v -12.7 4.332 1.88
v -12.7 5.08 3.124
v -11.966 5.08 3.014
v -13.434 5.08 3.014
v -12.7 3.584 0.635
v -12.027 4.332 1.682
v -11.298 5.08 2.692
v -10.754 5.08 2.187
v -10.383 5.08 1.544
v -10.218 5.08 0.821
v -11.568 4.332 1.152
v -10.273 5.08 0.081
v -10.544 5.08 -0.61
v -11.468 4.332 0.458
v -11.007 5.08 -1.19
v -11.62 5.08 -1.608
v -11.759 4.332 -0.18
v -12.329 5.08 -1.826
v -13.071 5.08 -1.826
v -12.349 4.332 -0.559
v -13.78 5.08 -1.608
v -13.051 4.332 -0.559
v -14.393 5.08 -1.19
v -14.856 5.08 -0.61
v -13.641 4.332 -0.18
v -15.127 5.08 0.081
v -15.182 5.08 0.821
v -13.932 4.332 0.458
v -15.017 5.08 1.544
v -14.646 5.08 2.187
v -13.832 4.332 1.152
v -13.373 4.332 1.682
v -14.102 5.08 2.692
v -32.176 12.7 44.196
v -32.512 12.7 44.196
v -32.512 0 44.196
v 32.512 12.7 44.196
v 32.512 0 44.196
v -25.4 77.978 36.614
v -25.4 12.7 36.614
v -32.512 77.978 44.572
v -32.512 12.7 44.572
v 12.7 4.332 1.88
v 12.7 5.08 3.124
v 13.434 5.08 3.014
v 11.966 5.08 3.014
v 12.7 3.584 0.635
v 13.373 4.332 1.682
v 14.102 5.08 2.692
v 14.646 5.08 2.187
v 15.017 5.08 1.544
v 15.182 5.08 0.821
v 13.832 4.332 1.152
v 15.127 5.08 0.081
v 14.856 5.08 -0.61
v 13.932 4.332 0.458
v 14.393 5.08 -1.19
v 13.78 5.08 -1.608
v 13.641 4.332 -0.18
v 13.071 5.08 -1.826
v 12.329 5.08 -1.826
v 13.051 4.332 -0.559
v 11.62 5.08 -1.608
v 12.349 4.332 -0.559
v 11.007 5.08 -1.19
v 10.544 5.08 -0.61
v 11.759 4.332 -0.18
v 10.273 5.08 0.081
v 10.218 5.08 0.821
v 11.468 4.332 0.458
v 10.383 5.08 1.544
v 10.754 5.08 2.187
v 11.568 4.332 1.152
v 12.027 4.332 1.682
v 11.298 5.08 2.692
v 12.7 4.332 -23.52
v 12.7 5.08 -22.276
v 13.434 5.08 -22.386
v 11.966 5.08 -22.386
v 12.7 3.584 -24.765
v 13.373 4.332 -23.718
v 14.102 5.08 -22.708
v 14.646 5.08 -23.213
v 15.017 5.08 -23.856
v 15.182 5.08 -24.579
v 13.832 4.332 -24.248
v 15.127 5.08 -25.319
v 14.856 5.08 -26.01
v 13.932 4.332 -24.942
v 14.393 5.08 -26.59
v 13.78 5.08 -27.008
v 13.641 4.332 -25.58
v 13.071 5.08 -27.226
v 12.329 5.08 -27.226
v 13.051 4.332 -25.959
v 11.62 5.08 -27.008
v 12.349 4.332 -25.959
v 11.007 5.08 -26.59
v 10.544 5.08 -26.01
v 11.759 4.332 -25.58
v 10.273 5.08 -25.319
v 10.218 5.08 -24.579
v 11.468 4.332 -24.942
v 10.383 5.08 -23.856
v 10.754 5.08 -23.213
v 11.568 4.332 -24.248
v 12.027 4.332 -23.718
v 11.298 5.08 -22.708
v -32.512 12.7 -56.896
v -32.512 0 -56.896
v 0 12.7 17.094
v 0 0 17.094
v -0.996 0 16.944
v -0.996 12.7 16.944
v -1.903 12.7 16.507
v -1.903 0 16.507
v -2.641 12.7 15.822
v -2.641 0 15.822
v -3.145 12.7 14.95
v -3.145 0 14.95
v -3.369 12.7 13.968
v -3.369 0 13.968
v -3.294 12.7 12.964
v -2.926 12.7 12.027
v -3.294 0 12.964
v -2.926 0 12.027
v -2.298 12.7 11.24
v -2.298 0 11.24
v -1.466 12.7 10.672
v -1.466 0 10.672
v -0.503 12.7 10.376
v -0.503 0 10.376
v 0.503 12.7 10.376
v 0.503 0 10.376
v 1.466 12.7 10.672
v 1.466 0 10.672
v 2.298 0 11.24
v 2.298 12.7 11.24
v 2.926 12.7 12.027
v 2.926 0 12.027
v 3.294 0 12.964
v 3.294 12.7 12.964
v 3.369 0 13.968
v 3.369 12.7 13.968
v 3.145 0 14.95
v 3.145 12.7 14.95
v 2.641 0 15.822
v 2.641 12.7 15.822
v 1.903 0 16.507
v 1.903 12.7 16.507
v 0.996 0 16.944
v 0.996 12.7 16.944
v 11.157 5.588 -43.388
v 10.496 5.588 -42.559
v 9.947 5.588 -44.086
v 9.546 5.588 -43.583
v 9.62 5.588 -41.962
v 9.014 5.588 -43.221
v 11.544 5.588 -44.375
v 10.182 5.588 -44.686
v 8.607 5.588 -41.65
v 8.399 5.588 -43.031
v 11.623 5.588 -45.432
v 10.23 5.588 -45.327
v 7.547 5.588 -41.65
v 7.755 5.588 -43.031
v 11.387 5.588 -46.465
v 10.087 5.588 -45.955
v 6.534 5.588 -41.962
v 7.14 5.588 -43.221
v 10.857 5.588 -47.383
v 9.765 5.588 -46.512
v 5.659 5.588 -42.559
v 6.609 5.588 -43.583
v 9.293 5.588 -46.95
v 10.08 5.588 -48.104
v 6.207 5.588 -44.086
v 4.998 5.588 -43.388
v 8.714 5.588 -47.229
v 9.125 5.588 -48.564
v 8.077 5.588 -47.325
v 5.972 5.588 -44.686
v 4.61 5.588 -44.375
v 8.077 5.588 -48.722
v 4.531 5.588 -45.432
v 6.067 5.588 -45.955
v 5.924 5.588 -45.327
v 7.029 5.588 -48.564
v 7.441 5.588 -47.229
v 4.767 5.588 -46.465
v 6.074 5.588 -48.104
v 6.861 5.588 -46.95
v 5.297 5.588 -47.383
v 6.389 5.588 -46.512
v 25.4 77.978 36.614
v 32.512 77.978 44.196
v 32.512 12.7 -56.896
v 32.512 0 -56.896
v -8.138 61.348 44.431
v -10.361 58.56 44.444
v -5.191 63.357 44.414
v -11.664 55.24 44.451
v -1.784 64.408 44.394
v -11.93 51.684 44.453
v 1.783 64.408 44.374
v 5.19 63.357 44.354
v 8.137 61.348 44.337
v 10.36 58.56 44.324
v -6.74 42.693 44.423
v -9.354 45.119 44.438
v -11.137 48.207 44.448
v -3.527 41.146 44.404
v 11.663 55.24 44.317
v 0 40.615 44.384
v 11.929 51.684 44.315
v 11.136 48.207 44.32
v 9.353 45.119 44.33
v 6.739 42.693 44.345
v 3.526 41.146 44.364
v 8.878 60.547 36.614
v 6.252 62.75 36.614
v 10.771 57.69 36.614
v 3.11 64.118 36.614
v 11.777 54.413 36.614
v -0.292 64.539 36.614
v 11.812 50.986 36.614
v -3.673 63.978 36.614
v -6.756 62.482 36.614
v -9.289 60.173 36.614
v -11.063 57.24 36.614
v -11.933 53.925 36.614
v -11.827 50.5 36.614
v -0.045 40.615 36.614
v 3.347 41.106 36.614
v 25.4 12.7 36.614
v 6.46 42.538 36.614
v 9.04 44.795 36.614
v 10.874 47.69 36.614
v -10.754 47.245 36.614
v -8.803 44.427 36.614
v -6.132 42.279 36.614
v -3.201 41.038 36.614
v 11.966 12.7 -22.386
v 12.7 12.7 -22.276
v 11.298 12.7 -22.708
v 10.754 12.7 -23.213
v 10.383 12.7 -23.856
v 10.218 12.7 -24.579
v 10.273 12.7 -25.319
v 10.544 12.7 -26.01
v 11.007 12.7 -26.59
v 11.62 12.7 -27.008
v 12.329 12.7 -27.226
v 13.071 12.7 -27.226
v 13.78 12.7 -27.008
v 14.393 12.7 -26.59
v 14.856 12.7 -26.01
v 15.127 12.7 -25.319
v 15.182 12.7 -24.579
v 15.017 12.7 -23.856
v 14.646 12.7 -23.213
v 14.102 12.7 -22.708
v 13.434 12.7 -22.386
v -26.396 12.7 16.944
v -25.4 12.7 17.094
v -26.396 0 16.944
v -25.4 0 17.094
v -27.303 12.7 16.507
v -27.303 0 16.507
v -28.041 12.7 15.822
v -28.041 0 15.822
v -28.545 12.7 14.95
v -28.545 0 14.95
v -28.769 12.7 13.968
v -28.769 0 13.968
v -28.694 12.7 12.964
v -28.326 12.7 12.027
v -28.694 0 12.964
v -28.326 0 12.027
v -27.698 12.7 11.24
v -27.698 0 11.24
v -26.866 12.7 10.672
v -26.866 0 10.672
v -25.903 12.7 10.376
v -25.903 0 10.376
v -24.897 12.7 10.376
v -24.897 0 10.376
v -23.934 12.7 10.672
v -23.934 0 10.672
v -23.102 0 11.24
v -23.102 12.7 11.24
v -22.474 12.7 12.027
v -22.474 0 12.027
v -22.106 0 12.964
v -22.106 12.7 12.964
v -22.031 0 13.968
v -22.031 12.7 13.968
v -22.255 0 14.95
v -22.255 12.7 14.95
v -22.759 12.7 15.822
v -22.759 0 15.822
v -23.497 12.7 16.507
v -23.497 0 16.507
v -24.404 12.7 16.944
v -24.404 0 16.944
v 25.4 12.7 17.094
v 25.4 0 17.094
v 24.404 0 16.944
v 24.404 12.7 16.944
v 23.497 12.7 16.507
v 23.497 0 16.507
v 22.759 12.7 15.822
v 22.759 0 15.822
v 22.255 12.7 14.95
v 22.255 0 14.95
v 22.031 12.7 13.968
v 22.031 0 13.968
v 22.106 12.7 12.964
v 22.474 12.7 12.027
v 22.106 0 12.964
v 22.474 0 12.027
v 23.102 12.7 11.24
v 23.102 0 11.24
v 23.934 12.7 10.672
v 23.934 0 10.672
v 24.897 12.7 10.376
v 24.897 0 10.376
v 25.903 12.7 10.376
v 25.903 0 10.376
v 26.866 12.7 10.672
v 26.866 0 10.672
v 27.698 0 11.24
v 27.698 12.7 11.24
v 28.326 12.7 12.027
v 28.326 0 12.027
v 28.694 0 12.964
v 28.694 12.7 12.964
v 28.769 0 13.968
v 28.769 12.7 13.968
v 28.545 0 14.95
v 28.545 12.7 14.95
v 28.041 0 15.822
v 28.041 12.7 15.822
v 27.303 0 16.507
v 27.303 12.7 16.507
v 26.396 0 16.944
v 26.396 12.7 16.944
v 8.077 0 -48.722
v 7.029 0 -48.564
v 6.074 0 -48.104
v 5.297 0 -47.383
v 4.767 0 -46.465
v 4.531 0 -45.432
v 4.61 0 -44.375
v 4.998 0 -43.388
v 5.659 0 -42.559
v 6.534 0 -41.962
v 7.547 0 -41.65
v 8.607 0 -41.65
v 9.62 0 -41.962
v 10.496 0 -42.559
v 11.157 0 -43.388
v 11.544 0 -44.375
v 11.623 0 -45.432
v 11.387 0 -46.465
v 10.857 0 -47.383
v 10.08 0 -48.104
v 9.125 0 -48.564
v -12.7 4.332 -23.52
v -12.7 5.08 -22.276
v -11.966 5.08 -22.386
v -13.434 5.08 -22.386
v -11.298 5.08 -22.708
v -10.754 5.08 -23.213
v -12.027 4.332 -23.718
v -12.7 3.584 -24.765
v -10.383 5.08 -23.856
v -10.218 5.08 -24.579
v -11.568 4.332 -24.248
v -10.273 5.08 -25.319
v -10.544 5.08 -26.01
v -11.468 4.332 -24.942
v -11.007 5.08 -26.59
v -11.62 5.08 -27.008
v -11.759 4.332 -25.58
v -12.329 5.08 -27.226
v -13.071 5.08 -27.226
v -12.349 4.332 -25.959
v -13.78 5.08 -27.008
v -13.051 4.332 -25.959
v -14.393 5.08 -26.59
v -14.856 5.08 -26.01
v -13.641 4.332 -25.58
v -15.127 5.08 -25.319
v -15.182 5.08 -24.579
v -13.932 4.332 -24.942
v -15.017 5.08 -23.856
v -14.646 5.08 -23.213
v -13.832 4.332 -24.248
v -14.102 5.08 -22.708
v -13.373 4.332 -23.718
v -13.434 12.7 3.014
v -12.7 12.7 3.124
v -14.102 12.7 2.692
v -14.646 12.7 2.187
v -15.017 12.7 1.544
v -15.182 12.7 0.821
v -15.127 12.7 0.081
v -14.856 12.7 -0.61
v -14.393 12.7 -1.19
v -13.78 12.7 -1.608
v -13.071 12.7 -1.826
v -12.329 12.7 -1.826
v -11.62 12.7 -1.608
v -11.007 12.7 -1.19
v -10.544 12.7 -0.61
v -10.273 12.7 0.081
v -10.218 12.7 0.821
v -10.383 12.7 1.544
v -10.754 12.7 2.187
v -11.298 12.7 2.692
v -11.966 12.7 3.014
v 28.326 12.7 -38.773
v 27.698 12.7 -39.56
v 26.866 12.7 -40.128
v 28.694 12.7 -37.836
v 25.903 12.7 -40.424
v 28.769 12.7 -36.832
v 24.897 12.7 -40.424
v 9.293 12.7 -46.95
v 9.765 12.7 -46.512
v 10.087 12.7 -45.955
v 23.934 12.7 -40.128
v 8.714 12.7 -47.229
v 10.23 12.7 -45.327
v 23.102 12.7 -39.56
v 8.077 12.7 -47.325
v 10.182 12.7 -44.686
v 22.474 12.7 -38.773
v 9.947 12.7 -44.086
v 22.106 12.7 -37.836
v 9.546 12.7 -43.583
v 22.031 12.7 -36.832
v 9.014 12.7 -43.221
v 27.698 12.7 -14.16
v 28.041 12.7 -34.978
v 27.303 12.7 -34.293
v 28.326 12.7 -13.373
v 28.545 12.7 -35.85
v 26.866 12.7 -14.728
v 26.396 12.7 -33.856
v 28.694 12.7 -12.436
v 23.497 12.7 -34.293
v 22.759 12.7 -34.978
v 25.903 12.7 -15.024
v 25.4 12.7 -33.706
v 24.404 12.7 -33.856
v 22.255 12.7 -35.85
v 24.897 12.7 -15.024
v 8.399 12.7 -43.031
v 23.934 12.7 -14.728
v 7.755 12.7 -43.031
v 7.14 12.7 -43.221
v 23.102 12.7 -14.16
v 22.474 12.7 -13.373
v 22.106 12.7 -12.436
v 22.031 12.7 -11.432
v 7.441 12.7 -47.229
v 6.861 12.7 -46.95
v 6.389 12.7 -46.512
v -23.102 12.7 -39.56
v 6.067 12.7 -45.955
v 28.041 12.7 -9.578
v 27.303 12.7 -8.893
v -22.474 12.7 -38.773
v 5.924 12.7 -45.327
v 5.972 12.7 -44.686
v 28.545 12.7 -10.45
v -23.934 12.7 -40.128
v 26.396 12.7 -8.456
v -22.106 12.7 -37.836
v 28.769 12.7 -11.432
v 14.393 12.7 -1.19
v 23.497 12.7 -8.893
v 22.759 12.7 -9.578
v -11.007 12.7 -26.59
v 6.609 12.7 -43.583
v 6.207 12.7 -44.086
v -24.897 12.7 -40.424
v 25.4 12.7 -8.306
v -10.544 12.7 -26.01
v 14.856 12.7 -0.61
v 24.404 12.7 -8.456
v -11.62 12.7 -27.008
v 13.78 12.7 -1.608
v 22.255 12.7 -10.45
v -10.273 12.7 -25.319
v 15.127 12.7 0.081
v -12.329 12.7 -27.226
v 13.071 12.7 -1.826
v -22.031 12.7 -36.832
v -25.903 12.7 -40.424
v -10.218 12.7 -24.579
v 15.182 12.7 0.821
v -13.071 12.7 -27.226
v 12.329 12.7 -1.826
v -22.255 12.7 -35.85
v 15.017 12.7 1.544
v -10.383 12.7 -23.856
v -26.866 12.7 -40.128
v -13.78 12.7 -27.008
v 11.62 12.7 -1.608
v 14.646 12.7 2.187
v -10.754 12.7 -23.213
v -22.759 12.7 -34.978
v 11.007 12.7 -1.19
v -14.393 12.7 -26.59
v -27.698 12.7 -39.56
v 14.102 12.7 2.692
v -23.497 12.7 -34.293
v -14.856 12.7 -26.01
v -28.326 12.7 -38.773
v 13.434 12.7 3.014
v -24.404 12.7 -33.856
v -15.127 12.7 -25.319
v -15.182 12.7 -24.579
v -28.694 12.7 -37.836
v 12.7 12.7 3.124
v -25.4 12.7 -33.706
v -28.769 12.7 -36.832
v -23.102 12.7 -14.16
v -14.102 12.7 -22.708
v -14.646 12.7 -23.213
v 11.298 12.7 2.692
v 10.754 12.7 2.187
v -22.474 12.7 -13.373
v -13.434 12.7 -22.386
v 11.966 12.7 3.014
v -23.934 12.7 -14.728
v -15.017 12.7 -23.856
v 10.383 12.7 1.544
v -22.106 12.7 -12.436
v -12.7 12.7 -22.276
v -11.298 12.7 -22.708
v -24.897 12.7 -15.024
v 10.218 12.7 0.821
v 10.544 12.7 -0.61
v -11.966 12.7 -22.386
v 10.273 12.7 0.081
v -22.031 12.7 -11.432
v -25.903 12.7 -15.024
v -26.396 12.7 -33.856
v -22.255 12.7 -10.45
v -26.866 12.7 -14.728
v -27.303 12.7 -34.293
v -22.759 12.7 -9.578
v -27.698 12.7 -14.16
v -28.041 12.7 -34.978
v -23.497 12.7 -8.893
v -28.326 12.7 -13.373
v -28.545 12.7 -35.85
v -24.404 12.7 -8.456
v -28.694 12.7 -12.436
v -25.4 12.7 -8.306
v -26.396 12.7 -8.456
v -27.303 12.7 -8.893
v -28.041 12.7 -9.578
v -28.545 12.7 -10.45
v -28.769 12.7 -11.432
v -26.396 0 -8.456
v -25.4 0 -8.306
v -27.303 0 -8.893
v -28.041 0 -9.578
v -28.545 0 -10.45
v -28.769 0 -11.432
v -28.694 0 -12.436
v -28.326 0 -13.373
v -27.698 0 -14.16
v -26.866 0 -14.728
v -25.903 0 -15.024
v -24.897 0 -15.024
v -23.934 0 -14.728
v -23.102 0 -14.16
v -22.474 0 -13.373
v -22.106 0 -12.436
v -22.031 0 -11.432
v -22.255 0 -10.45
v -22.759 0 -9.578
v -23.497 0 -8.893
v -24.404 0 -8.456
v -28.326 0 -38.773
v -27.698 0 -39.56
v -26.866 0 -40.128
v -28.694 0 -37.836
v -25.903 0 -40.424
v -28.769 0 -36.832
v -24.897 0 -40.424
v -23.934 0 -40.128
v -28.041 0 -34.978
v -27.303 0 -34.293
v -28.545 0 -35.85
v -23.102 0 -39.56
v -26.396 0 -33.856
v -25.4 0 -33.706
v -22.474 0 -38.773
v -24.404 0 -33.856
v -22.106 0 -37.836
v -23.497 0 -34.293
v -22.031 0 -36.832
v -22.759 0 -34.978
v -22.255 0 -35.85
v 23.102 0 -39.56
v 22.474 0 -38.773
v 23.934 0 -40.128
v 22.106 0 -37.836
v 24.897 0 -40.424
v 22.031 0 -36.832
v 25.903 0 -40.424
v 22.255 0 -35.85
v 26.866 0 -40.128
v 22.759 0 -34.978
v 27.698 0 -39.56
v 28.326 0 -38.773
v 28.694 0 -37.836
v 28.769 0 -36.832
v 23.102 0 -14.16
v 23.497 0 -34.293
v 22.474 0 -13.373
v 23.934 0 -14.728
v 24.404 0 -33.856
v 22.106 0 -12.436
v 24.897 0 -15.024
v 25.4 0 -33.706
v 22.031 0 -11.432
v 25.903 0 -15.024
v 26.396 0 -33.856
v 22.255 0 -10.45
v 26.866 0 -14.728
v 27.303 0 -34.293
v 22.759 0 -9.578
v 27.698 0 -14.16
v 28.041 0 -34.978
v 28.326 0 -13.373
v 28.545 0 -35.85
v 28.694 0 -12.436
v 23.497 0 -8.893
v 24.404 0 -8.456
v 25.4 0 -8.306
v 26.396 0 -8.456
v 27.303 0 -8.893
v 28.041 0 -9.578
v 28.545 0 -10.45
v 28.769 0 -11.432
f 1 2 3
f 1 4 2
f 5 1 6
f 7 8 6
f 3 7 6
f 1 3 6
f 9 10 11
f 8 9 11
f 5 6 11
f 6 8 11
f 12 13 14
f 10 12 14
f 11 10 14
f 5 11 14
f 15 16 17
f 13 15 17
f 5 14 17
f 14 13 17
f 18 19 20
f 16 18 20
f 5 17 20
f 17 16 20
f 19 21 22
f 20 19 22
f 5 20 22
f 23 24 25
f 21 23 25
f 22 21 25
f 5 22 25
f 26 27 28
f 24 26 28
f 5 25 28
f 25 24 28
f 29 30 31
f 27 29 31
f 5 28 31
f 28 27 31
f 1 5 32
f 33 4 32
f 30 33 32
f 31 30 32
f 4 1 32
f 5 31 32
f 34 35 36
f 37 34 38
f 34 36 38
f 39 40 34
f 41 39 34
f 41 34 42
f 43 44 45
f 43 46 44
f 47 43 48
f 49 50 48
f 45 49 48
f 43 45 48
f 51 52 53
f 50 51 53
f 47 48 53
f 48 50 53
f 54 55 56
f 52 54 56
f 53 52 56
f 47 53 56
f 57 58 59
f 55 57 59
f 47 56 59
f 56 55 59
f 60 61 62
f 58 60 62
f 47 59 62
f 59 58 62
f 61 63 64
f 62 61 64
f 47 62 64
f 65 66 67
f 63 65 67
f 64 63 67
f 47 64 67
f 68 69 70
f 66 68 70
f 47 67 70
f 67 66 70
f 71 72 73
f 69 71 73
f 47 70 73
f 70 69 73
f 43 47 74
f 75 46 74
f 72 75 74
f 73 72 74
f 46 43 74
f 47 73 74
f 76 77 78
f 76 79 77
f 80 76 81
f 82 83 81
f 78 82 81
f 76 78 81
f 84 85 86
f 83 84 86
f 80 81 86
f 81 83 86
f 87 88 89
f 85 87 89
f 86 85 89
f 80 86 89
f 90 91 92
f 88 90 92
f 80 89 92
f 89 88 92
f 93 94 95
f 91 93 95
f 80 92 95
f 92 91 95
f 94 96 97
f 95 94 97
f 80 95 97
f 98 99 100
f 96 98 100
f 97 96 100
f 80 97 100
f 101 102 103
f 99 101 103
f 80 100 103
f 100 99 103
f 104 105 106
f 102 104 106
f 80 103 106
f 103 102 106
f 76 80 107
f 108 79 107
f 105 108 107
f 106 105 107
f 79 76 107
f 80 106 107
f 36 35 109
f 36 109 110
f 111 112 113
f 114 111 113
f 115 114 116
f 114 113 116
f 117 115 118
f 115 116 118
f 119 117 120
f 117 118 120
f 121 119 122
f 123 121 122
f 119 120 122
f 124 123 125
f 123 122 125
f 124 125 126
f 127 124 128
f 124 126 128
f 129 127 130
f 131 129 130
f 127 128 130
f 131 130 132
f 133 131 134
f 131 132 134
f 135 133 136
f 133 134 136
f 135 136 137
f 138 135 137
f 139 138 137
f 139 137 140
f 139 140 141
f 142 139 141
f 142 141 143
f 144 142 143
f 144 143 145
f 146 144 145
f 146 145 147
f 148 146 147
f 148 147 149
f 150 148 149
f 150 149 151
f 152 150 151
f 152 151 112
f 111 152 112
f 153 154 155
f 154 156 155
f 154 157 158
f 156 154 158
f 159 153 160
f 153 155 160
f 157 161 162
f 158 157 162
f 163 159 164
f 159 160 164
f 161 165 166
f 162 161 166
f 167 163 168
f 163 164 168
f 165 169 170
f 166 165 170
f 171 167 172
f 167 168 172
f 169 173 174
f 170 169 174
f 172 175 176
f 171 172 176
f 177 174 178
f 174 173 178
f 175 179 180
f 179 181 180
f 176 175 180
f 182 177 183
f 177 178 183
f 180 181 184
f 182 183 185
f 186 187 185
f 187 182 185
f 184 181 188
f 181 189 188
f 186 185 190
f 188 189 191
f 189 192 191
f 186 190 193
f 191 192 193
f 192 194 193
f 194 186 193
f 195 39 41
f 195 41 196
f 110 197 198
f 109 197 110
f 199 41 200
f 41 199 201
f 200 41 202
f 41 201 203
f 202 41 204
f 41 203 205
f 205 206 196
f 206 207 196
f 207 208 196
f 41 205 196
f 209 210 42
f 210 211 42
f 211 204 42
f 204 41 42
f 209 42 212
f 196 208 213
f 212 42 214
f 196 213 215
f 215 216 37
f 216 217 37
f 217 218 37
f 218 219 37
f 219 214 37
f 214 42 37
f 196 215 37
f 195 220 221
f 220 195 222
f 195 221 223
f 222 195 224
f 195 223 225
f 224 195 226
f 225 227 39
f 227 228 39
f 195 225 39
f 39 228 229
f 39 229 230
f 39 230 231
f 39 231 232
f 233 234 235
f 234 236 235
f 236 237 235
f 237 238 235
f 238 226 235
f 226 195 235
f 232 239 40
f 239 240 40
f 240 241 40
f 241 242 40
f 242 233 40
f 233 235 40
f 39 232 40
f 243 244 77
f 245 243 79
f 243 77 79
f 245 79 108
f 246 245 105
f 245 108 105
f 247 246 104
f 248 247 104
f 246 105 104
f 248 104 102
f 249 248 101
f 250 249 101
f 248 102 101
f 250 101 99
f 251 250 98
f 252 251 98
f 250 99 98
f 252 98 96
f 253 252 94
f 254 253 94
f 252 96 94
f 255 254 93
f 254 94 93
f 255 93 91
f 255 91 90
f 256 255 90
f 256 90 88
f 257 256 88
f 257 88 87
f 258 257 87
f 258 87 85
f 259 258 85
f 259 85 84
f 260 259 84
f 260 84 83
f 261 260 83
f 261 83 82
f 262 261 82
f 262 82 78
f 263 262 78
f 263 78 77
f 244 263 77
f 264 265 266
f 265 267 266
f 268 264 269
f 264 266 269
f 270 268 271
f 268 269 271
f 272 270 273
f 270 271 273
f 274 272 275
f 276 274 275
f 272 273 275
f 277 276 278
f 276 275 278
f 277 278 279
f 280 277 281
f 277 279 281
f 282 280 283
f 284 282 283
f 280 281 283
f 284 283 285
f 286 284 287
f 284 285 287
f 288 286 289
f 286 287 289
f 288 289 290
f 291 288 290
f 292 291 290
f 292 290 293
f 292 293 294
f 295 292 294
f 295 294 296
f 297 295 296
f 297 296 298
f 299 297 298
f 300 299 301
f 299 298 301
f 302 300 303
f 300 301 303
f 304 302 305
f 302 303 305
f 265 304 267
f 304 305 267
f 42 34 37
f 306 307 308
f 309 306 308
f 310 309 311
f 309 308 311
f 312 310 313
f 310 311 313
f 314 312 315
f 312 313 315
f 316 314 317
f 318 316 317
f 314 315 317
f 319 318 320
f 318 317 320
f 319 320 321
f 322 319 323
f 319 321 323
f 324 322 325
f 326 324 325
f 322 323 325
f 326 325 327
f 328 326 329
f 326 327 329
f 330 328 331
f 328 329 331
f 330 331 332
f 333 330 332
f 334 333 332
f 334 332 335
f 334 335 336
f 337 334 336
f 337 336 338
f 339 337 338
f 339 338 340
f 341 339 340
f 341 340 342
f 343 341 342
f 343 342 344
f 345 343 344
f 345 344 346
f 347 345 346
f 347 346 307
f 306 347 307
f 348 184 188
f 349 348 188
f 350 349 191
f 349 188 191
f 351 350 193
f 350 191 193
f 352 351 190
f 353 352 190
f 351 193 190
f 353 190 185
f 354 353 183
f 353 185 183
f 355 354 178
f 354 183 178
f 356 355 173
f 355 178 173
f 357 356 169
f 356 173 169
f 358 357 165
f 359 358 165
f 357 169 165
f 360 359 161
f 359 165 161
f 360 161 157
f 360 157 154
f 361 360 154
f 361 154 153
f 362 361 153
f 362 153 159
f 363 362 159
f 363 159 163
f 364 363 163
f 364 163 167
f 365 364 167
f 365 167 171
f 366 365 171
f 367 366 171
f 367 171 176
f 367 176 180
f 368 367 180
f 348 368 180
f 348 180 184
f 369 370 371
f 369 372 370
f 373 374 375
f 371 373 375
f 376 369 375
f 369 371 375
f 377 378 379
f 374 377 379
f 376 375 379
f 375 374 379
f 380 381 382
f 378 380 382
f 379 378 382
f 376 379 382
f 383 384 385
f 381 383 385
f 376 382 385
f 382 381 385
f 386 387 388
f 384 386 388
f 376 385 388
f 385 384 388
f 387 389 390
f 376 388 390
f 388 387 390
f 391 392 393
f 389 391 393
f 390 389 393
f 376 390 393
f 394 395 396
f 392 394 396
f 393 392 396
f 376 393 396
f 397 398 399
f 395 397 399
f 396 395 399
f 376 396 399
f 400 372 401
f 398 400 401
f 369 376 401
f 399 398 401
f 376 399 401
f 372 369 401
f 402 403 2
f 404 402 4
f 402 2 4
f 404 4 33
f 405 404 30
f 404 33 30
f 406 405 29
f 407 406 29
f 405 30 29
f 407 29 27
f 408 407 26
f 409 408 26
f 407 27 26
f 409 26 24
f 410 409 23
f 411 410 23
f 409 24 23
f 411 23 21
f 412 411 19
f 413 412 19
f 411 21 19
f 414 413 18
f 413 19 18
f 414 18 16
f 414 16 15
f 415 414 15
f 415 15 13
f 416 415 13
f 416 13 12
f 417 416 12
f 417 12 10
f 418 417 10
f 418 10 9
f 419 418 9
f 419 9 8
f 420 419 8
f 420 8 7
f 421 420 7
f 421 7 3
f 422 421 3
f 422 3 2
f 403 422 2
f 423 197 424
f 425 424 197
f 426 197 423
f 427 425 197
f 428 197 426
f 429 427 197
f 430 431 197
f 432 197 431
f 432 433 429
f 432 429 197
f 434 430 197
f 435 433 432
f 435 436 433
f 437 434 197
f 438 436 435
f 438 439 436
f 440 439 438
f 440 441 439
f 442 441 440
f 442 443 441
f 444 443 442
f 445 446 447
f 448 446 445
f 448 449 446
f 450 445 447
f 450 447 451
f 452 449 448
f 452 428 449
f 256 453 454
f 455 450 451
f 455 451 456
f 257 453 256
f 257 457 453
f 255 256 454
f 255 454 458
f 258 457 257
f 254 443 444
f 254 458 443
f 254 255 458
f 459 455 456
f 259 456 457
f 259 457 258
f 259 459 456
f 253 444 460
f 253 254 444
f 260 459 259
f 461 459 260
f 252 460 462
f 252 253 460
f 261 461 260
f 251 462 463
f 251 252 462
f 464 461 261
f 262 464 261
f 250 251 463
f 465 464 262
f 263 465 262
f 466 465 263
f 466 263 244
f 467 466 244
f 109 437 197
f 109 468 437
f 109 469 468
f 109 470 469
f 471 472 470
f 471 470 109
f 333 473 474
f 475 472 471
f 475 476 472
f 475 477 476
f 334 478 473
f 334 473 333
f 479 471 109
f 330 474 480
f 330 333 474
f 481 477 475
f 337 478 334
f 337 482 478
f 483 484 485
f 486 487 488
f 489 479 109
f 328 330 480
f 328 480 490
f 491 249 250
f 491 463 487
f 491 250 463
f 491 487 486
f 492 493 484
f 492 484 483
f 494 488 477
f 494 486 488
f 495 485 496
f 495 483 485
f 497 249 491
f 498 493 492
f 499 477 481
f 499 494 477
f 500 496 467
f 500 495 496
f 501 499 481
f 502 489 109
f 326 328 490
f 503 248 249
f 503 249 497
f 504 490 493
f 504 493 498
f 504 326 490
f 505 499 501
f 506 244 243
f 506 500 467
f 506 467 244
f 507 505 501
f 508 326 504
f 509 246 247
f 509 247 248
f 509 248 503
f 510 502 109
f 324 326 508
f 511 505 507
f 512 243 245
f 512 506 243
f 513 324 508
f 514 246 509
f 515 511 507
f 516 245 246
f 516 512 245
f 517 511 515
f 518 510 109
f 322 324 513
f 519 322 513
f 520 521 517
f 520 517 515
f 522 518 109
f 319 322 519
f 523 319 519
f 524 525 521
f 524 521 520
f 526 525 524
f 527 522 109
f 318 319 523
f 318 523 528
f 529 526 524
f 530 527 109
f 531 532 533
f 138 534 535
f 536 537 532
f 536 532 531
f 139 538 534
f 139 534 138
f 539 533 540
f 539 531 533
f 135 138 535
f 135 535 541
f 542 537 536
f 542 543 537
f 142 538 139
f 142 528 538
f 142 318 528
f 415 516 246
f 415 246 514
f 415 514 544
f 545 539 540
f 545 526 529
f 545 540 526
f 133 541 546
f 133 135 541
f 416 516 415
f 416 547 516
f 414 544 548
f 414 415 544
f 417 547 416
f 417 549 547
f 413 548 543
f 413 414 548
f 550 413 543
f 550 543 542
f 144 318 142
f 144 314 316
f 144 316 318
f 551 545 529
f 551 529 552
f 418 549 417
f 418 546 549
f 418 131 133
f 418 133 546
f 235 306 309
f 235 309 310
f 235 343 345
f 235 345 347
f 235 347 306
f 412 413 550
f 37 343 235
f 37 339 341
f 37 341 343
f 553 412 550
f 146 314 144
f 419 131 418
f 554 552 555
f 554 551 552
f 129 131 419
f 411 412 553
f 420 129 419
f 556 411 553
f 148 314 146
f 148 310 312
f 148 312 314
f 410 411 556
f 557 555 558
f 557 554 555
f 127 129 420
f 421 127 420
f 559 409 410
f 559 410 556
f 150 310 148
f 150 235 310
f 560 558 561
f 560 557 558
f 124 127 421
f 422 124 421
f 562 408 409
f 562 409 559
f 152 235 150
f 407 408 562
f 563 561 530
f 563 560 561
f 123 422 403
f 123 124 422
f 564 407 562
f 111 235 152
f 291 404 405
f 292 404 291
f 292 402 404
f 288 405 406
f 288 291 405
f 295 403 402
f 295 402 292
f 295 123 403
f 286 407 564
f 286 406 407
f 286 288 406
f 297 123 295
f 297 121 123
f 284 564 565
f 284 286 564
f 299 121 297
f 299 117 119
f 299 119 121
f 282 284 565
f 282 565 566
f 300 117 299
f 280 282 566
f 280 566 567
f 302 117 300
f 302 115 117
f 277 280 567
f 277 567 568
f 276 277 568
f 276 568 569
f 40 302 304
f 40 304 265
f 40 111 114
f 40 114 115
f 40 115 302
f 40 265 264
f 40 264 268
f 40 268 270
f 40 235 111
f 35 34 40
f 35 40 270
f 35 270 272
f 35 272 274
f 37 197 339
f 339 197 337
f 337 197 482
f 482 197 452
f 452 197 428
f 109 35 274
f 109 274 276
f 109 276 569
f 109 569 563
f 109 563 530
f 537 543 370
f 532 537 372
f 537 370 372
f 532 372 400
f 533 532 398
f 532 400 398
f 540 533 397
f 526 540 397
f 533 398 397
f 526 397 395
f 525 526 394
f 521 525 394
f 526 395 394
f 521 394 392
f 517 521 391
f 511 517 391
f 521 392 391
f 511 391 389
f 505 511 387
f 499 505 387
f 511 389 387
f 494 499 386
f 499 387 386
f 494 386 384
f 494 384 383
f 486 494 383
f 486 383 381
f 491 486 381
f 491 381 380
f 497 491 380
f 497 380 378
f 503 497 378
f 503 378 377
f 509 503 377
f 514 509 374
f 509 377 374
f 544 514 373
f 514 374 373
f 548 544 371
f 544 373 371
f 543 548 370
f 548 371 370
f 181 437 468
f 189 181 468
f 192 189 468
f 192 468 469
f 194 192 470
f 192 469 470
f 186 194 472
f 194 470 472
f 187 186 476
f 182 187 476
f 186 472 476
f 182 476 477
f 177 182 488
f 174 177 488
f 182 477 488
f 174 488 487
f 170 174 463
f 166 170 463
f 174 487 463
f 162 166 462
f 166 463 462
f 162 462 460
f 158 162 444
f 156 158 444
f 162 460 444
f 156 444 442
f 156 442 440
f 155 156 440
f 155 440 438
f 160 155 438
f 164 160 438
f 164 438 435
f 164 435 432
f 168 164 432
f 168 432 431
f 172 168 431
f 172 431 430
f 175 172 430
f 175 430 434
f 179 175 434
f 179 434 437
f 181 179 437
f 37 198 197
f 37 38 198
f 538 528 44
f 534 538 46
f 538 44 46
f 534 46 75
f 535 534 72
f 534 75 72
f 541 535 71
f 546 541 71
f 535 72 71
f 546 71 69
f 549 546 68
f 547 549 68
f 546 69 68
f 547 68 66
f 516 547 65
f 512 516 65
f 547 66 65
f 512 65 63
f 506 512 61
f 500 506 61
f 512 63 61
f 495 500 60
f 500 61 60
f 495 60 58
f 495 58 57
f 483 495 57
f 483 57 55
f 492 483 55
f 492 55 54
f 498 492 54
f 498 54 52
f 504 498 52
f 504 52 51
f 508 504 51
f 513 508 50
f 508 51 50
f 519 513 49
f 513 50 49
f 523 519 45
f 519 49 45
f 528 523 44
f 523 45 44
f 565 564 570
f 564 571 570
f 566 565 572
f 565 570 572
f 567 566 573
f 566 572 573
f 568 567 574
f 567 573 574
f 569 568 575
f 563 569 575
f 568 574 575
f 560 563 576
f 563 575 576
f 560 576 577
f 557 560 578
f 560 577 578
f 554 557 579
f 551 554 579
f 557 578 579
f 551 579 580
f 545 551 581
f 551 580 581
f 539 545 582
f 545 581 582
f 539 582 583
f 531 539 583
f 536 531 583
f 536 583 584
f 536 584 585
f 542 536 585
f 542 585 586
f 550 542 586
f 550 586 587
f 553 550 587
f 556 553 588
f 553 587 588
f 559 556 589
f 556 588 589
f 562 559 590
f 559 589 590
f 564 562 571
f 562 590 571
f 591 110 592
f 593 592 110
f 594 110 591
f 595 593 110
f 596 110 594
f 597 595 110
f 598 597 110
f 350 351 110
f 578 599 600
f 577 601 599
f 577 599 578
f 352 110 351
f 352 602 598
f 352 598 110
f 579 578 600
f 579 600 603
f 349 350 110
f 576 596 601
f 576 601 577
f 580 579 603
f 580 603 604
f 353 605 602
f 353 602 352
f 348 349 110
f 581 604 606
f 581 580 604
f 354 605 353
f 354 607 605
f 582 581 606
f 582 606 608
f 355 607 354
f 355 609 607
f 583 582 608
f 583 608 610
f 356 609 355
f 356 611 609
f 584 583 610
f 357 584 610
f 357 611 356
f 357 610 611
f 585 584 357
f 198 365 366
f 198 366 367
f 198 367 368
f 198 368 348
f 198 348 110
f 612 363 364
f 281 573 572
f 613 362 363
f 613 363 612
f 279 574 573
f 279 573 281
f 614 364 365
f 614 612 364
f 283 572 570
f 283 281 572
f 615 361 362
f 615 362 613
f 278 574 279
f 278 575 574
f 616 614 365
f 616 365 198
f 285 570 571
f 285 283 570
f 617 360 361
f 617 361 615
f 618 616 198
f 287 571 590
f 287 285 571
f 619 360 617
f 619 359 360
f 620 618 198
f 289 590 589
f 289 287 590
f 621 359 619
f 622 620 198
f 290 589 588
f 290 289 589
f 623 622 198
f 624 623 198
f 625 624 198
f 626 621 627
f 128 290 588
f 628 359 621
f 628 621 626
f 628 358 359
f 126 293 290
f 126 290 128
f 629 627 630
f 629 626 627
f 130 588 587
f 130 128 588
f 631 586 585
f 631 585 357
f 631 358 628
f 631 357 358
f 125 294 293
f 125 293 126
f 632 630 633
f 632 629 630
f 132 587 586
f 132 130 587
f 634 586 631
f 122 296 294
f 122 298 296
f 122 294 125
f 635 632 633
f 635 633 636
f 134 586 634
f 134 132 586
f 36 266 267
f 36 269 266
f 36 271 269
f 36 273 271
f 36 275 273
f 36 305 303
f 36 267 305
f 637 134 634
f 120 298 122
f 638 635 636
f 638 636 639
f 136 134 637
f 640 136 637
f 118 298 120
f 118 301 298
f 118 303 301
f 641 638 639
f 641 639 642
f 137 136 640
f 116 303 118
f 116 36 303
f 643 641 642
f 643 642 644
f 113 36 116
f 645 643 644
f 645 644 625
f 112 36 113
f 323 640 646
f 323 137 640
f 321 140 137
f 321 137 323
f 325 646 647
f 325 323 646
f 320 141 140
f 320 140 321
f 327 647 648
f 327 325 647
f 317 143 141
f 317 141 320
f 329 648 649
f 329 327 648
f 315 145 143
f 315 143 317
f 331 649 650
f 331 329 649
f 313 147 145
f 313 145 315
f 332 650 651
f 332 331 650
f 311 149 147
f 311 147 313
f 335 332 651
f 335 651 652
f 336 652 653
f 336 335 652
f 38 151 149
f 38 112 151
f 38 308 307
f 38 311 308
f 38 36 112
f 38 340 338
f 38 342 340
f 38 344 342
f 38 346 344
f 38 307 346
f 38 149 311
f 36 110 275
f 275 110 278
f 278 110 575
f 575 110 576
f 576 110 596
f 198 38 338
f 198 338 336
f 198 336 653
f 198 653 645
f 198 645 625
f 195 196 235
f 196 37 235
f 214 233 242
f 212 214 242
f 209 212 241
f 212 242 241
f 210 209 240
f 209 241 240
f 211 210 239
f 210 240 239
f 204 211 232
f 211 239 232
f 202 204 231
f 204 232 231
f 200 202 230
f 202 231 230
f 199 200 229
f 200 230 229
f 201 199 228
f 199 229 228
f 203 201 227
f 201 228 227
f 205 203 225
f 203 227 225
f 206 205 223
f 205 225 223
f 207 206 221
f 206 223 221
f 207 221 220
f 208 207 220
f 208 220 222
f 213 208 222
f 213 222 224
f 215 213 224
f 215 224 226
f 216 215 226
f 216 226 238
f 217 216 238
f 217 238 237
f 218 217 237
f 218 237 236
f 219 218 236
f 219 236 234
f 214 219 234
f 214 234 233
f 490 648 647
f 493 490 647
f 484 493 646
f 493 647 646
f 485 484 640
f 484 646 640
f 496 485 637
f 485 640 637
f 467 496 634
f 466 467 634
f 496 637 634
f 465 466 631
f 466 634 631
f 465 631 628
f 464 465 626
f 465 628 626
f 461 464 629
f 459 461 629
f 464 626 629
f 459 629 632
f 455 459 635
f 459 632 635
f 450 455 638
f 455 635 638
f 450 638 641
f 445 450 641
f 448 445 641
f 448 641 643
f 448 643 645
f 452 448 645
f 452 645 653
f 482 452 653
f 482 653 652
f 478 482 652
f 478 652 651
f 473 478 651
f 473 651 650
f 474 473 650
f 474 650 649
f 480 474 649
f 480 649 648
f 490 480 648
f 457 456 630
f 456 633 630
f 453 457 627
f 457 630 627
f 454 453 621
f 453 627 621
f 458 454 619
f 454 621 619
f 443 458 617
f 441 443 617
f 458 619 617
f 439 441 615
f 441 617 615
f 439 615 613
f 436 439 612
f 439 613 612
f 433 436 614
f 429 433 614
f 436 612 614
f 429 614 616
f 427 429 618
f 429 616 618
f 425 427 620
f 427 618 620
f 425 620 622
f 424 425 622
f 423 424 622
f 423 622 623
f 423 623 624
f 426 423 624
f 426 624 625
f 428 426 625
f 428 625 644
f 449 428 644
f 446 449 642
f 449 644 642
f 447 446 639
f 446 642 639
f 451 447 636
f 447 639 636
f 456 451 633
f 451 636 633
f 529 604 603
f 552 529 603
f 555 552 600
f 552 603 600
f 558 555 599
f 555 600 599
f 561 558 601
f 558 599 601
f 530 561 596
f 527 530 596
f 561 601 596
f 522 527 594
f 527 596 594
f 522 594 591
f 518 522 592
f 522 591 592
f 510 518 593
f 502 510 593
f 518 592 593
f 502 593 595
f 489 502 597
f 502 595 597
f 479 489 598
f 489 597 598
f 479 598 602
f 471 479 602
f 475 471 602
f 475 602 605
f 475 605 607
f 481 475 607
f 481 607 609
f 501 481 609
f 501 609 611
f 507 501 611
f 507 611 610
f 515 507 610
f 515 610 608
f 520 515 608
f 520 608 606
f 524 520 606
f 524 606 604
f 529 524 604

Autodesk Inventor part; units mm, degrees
ref_plane "YZ Plane" through (0, 0, 0) normal (1, 0, 0) x (0, 1, 0)
ref_plane "XZ Plane" through (0, 0, 0) normal (0, 1, 0) x (-1, 0, 0)
ref_plane "XY Plane" through (0, 0, 0) normal (0, 0, 1) x (1, 0, 0)
sketch "Sketch1" plane through (0, 0, 0) normal (0, 1, 0) x (-1, 0, 0)
  line L0 (-32.512, -44.196) -> (32.512, -44.196)
  line L1 (32.512, -44.196) -> (32.512, 44.196)
  line L2 (32.512, 44.196) -> (-32.512, 44.196)
  line L3 (-32.512, 44.196) -> (-32.512, -44.196)
  line L4 (-32.512, -44.196) -> (32.512, 44.196) construction
  line L5 (32.512, -44.196) -> (-32.512, 44.196) construction
  point P0 (0, 0)
  point P1 (0, 0)
  dimension "d0" = 65.024
  dimension "d1" = 88.392
extrude "Extrusion1" add sketch "Sketch1" along normal blind 12.7
hole "Hole1" at (-25.4, 12.7, -37.084) direction (0, -1, 0) diameter 6.7564 end through all clearance for "Flat Head Machine Screw (82)" size "1/4" standard "Ansi Unified Screw Threads"
hole "Hole3" at (25.4, 12.7, -37.084) direction (0, -1, 0) diameter 6.7564 end through all clearance for "Flat Head Machine Screw (82)" size "1/4" standard "Ansi Unified Screw Threads"
hole "Hole4" at (25.4, 12.7, -11.684) direction (0, -1, 0) diameter 6.7564 end through all clearance for "Flat Head Machine Screw (82)" size "1/4" standard "Ansi Unified Screw Threads"
hole "Hole5" at (25.4, 12.7, 13.716) direction (0, -1, 0) diameter 6.7564 end through all clearance for "Flat Head Machine Screw (82)" size "1/4" standard "Ansi Unified Screw Threads"
hole "Hole6" at (0, 12.7, 13.716) direction (0, -1, 0) diameter 6.7564 end through all clearance for "Flat Head Machine Screw (82)" size "1/4" standard "Ansi Unified Screw Threads"
hole "Hole7" at (-25.4, 12.7, 13.716) direction (0, -1, 0) diameter 6.7564 end through all clearance for "Flat Head Machine Screw (82)" size "1/4" standard "Ansi Unified Screw Threads"
hole "Hole8" at (-25.4, 12.7, -11.684) direction (0, -1, 0) diameter 6.7564 end through all clearance for "Flat Head Machine Screw (82)" size "1/4" standard "Ansi Unified Screw Threads"
sketch "Sketch2" plane through (0, 12.7, 0) normal (0, 1, 0) x (1, 0, 0)
  line L0 (-32.512, -44.5719) -> (32.512, -44.196)
  line L1 (32.512, -44.196) -> (25.4, -36.614)
  line L2 (25.4, -36.614) -> (-25.4, -36.614)
  line L3 (-25.4, -36.614) -> (-32.512, -44.5719)
  line L4 (-32.512, -44.5719) -> (25.4, -36.614) construction
  line L5 (32.512, -44.196) -> (-25.4, -36.614) construction
  point P0 (0, 0)
  point P1 (0.6144, -40.0199)
extrude "Extrusion2" add sketch "Sketch2" along normal blind 65.278
hole "Hole9" at (-0.0005, 52.578, 44.384) direction (-0.0057808, 0, -0.9999833) diameter 23.9268 end through all
sketch "Sketch3" plane through (32.512, 0, -44.196) normal (0, 0, -1) x (-1, 0, 0)
  line L0 (0, 12.7) -> (65.024, 12.7)
  line L1 (65.024, 12.7) -> (65.024, 0)
  line L2 (65.024, 0) -> (0, 0)
  line L3 (0, 0) -> (0, 12.7)
  line L4 (0, 12.7) -> (65.024, 0) construction
  line L5 (65.024, 12.7) -> (0, 0) construction
  point P0 (32.512, 0)
  point P1 (32.512, 6.35)
extrude "Extrusion3" add sketch "Sketch3" along normal blind 12.7
hole "Hole10" at (8.0772, 0, -45.166) direction (0, 1, 0) diameter 4.318 end through all counterbore diameter 7.112 counterbore depth 5.588
hole "Hole13" at (12.7, 12.7, 0.635) direction (0, -1, 0) diameter 4.9784 depth 7.62 tip angle 118 thread size "1/4-20 UNC" class "2B" standard "ANSI Unified Screw Threads"
hole "Hole14" at (-12.7, 12.7, 0.635) direction (0, -1, 0) diameter 4.9784 depth 7.62 tip angle 118 thread size "1/4-20 UNC" class "2B" standard "ANSI Unified Screw Threads"
sketch "Sketch4" plane through (32.512, 12.7, 36.614) normal (1, 0, 0) x (0, 0, -1)
  line L0 (-7.582, -12.7) -> (93.51, -12.7) projected
  line L1 (93.51, 0) -> (93.51, -12.7) projected
  line L2 (0, 0) -> (93.51, 0) projected
  line L3 (0, 0) -> (0, 65.278) projected
  line L4 (-7.582, 65.278) -> (0, 65.278) projected
  line L5 (-7.582, 0) -> (-7.582, 65.278) projected
  line L6 (-18.542, 0) -> (-18.1661, 0) projected
  line L7 (-7.582, -12.7) -> (-7.582, 0) projected
  point P0 (36.614, -12.7)
sketch "Sketch5" plane through (32.512, 12.7, 36.614) normal (1, 0, 0) x (0, 0, -1)
  line L0 (-7.582, -12.7) -> (93.51, -12.7) projected
  line L1 (93.51, 0) -> (93.51, -12.7) projected
  line L2 (0, 0) -> (93.51, 0) projected
  line L3 (0, 0) -> (0, 65.278) projected
  line L4 (-7.582, 65.278) -> (0, 65.278) projected
  line L5 (-7.582, 0) -> (-7.582, 65.278) projected
  line L6 (-18.542, 0) -> (-18.1661, 0) projected
  line L7 (-7.582, -12.7) -> (-7.582, 0) projected
  point P0 (36.614, -12.7)
sketch "Sketch6" plane through (0, 77.978, 0) normal (0, 1, 0) x (1, 0, 0)
  line L0 (-32.512, -44.5719) -> (32.512, -44.196) projected
  line L1 (32.512, -44.196) -> (25.4, -36.614) projected
  line L2 (25.4, -36.614) -> (-25.4, -36.614) construction
  line L3 (-25.4, -36.614) -> (-32.512, -44.5719) projected
  point P0 (0, 0)
sketch "Sketch7" plane through (32.512, 12.7, 36.614) normal (1, 0, 0) x (0, 0, -1)
  line L0 (-7.582, -12.7) -> (93.51, -12.7) projected
  line L1 (93.51, 0) -> (93.51, -12.7) projected
  line L2 (0, 0) -> (93.51, 0) projected
  line L3 (0, 0) -> (0, 65.278) projected
  line L4 (-7.582, 65.278) -> (0, 65.278) projected
  line L5 (-7.582, 0) -> (-7.582, 65.278) construction
  line L6 (-18.542, 0) -> (-18.1661, 0) projected
  line L7 (-7.582, -12.7) -> (-7.582, 0) projected
  point P0 (36.614, -12.7)
sketch "Sketch8" plane through (-32.512, 12.7, 44.5719) normal (0.0057808, 0, 0.9999833) x (0.9999833, 0, -0.0057808)
  circle A0 centre (32.512, 39.878) radius 11.9634 projected
  line L0 (0, 0) -> (65.0251, 0) projected
  line L1 (65.0251, 0) -> (65.0251, 65.278) projected
  line L2 (0, 65.278) -> (65.0251, 65.278) projected
  line L3 (0, 0) -> (0, 65.278) projected
  point P0 (65.024, 0)
  point P1 (32.7691, -12.7)
hole "Hole16" at (12.7, 12.7, -24.765) direction (0, -1, 0) diameter 4.9784 depth 7.62 tip angle 118 thread size "1/4-20 UNC" class "2B" standard "ANSI Unified Screw Threads"
hole "Hole17" at (-12.7, 12.7, -24.765) direction (0, -1, 0) diameter 4.9784 depth 7.62 tip angle 118 thread size "1/4-20 UNC" class "2B" standard "ANSI Unified Screw Threads"
properties part number "DetectionAdapter"
